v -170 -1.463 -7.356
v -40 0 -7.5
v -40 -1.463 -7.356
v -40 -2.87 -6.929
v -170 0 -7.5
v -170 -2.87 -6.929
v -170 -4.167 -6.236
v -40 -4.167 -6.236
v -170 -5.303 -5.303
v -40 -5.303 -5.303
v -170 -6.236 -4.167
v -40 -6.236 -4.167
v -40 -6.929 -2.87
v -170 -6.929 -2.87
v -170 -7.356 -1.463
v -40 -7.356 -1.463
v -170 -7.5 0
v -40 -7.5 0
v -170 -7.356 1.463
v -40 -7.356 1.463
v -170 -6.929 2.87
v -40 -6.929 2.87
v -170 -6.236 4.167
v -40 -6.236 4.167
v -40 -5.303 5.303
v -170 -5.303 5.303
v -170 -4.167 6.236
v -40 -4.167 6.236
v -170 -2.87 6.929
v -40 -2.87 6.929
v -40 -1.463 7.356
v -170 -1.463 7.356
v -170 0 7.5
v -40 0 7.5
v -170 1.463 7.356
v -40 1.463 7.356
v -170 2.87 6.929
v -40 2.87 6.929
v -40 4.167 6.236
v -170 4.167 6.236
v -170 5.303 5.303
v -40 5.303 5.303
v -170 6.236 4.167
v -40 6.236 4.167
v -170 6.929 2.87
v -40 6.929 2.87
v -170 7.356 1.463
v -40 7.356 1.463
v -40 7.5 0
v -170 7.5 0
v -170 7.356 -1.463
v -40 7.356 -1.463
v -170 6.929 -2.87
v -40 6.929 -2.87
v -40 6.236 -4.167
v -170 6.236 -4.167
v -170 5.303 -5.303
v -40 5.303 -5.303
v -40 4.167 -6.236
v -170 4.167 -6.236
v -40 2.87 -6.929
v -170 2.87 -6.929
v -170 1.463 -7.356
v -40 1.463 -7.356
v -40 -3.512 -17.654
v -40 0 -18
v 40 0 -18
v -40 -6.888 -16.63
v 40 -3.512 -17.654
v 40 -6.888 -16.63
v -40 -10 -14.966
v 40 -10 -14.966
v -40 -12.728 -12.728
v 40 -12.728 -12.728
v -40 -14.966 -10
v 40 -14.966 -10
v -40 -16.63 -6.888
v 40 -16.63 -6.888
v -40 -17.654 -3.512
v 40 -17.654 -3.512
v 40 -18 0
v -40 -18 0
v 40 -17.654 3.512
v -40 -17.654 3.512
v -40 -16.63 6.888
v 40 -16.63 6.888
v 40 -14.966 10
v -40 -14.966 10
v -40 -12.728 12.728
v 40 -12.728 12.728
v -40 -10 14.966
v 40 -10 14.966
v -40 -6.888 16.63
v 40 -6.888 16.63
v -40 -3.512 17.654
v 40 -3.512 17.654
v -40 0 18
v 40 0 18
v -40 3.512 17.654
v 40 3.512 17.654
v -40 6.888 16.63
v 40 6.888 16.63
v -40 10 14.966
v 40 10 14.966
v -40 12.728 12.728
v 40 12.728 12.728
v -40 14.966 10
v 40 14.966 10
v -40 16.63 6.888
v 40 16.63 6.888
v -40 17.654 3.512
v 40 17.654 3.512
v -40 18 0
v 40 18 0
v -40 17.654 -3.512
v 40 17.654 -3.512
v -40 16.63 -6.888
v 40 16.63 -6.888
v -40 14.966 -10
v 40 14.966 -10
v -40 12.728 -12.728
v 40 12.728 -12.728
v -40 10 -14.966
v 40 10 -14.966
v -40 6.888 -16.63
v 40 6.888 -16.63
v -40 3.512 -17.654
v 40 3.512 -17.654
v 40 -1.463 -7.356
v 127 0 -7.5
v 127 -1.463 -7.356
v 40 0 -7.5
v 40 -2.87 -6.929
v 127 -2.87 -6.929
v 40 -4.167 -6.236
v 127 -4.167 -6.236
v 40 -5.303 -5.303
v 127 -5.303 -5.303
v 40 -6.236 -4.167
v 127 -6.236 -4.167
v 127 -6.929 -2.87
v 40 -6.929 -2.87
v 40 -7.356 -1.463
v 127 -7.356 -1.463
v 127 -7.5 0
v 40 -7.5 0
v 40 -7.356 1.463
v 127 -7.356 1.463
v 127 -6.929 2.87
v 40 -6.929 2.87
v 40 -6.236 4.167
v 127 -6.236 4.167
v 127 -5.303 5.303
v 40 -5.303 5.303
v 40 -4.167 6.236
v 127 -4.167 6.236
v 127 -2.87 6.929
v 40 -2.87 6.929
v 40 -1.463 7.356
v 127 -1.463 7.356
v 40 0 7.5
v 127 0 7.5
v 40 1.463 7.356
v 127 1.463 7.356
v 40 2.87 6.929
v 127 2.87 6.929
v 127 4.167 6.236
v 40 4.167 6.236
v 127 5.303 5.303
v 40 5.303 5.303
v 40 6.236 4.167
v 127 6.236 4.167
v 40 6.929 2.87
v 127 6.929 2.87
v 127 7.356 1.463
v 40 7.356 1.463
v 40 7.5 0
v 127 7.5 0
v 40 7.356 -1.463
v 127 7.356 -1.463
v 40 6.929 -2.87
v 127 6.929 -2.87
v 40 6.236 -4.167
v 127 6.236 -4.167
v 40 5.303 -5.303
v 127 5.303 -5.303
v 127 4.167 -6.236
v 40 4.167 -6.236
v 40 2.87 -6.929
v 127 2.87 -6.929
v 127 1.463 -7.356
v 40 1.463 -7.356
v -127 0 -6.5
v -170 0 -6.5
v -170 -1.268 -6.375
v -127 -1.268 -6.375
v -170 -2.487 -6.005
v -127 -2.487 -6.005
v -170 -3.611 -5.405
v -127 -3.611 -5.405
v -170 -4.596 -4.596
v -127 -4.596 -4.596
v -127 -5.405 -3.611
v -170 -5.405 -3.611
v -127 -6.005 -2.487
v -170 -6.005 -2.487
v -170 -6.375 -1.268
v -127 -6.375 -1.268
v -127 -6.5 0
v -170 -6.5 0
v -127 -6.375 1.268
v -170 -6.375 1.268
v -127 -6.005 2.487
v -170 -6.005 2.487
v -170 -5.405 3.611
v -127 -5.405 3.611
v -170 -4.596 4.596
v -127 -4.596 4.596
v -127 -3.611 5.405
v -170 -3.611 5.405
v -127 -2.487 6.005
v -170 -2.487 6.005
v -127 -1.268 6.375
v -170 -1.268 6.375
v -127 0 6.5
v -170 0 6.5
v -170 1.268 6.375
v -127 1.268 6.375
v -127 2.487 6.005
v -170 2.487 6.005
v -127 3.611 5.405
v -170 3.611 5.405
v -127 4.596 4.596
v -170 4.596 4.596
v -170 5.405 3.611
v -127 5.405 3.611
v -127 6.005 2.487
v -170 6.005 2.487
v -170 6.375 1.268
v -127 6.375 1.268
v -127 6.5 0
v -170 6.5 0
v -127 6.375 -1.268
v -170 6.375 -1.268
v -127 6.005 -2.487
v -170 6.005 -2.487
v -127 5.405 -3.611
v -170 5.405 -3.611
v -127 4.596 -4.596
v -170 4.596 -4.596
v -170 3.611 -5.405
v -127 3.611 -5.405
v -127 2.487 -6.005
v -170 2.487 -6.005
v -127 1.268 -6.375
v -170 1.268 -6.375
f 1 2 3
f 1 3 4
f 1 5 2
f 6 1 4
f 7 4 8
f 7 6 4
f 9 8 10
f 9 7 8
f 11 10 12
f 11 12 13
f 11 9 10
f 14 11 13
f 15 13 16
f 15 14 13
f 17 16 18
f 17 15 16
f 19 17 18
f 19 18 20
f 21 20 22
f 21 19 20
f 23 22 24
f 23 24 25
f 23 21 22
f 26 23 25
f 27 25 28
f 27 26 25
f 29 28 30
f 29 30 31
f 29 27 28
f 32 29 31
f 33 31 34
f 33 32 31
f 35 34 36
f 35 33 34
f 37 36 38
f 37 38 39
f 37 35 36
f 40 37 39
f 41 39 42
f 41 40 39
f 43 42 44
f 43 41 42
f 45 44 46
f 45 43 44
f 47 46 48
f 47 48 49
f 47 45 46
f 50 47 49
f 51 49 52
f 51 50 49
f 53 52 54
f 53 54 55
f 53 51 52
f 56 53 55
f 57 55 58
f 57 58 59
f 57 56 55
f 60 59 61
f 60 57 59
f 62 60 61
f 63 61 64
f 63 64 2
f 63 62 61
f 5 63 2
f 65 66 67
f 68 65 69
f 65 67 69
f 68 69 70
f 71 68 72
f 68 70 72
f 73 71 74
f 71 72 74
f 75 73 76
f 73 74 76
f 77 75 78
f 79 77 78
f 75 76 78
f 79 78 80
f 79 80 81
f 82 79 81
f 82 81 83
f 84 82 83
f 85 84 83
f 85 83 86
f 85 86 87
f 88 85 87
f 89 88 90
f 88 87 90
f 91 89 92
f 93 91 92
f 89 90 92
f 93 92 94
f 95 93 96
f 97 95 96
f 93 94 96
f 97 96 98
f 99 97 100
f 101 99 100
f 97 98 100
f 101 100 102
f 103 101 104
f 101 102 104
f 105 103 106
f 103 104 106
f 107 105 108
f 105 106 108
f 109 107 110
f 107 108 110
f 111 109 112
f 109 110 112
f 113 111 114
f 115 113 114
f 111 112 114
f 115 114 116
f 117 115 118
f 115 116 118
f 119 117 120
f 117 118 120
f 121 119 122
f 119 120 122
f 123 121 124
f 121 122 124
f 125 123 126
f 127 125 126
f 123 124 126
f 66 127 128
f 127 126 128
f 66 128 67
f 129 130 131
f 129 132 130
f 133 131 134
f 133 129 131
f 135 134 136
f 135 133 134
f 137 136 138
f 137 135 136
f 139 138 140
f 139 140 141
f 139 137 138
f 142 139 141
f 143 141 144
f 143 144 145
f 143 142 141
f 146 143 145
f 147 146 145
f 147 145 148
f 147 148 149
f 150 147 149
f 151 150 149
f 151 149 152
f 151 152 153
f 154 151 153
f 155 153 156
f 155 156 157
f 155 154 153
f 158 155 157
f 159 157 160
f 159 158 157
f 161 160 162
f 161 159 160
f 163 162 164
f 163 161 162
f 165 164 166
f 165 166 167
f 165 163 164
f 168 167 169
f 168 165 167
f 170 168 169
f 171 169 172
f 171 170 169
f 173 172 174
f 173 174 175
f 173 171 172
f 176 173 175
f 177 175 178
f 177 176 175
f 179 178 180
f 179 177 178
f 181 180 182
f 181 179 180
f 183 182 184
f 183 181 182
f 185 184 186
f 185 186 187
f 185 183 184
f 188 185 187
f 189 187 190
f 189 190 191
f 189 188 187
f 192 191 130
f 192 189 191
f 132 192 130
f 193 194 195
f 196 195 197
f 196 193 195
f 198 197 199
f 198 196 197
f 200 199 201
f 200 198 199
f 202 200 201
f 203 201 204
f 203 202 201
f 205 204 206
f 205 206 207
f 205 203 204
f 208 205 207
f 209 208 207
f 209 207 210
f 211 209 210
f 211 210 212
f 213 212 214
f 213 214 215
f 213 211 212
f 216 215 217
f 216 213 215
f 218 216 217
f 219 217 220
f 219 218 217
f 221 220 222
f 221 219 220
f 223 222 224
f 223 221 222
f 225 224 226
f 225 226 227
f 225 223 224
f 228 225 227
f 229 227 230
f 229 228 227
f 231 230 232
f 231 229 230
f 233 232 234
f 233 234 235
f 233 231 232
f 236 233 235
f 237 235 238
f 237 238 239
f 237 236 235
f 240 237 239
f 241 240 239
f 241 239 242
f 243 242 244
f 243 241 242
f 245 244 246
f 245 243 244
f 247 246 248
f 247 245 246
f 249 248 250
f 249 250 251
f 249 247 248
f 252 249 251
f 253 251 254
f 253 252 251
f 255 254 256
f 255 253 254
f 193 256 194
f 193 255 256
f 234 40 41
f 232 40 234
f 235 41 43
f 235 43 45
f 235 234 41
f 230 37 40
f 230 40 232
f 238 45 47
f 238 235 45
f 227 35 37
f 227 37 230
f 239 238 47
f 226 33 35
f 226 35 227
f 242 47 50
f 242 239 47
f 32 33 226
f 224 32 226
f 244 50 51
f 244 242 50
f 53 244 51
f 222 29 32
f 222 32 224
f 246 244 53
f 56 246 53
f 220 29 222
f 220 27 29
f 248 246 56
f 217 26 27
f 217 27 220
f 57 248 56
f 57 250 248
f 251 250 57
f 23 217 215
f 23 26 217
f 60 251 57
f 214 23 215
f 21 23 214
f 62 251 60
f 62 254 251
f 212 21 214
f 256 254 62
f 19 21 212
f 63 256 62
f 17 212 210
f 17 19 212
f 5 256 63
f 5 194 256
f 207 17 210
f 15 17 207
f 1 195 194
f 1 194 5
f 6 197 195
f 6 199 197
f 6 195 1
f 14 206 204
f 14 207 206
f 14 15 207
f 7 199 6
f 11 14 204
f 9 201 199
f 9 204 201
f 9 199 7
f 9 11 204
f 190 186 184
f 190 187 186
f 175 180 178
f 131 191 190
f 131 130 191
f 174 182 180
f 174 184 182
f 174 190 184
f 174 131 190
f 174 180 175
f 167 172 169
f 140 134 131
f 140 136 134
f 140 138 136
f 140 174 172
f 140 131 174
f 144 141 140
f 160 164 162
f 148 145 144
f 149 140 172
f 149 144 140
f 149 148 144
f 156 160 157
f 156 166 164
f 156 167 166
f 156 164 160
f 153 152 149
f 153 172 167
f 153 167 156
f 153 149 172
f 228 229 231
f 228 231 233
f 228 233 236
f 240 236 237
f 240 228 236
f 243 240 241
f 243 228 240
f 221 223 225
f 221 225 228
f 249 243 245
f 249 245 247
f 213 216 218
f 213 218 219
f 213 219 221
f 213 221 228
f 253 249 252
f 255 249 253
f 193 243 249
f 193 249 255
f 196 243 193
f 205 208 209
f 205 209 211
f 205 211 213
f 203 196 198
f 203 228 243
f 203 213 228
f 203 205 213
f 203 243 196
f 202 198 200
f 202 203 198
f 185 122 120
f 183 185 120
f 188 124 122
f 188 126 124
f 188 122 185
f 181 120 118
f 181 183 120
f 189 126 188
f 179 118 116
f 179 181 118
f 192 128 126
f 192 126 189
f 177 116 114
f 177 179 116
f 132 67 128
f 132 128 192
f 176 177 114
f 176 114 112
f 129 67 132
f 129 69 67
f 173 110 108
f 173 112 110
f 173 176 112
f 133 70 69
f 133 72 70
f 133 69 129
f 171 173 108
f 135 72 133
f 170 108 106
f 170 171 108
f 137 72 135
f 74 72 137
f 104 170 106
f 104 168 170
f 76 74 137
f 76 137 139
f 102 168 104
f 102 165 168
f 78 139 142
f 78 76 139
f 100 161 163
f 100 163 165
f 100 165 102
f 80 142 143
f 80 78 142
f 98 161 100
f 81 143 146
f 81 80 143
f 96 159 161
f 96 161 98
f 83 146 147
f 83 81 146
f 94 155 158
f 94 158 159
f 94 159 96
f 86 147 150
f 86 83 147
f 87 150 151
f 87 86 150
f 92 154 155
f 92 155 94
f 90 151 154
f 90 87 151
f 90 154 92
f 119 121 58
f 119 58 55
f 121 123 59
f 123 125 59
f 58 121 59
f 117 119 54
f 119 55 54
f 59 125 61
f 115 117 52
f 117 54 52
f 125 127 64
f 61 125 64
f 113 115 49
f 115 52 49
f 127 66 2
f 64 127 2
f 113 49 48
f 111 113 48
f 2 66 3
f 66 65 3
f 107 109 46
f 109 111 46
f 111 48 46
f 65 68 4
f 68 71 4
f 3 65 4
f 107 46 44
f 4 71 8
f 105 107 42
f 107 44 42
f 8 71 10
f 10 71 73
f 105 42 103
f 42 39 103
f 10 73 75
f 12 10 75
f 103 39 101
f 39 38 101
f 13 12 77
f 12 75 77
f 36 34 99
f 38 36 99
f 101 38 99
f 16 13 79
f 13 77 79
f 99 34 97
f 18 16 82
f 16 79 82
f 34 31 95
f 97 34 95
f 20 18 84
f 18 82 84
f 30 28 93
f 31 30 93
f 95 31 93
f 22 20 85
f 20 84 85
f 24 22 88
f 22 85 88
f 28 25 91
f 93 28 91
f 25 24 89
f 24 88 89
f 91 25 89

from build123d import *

# Parameters (mm, degrees)
SKETCH1_W = 80
SKETCH1_H = 10.5


with BuildPart() as part:
    # Sketch1 → Revolve1 (revolve)
    with BuildSketch(Plane.XY, mode=Mode.PRIVATE) as revolve1_sk:
        with Locations((0, 12.75)):
            Rectangle(SKETCH1_W, SKETCH1_H)
        Polygon((-170, 6.5), (-127, 6.5), (-127, 0), (127, 0), (127, 7.5), (-170, 7.5), align=None)
    revolve(revolve1_sk.sketch.rotate(Axis((196.356223274, 0, 0), (-1, 0, 0)), 90), axis=Axis((196.356223274, 0, 0), (-1, 0, 0)))


solid = part.part
